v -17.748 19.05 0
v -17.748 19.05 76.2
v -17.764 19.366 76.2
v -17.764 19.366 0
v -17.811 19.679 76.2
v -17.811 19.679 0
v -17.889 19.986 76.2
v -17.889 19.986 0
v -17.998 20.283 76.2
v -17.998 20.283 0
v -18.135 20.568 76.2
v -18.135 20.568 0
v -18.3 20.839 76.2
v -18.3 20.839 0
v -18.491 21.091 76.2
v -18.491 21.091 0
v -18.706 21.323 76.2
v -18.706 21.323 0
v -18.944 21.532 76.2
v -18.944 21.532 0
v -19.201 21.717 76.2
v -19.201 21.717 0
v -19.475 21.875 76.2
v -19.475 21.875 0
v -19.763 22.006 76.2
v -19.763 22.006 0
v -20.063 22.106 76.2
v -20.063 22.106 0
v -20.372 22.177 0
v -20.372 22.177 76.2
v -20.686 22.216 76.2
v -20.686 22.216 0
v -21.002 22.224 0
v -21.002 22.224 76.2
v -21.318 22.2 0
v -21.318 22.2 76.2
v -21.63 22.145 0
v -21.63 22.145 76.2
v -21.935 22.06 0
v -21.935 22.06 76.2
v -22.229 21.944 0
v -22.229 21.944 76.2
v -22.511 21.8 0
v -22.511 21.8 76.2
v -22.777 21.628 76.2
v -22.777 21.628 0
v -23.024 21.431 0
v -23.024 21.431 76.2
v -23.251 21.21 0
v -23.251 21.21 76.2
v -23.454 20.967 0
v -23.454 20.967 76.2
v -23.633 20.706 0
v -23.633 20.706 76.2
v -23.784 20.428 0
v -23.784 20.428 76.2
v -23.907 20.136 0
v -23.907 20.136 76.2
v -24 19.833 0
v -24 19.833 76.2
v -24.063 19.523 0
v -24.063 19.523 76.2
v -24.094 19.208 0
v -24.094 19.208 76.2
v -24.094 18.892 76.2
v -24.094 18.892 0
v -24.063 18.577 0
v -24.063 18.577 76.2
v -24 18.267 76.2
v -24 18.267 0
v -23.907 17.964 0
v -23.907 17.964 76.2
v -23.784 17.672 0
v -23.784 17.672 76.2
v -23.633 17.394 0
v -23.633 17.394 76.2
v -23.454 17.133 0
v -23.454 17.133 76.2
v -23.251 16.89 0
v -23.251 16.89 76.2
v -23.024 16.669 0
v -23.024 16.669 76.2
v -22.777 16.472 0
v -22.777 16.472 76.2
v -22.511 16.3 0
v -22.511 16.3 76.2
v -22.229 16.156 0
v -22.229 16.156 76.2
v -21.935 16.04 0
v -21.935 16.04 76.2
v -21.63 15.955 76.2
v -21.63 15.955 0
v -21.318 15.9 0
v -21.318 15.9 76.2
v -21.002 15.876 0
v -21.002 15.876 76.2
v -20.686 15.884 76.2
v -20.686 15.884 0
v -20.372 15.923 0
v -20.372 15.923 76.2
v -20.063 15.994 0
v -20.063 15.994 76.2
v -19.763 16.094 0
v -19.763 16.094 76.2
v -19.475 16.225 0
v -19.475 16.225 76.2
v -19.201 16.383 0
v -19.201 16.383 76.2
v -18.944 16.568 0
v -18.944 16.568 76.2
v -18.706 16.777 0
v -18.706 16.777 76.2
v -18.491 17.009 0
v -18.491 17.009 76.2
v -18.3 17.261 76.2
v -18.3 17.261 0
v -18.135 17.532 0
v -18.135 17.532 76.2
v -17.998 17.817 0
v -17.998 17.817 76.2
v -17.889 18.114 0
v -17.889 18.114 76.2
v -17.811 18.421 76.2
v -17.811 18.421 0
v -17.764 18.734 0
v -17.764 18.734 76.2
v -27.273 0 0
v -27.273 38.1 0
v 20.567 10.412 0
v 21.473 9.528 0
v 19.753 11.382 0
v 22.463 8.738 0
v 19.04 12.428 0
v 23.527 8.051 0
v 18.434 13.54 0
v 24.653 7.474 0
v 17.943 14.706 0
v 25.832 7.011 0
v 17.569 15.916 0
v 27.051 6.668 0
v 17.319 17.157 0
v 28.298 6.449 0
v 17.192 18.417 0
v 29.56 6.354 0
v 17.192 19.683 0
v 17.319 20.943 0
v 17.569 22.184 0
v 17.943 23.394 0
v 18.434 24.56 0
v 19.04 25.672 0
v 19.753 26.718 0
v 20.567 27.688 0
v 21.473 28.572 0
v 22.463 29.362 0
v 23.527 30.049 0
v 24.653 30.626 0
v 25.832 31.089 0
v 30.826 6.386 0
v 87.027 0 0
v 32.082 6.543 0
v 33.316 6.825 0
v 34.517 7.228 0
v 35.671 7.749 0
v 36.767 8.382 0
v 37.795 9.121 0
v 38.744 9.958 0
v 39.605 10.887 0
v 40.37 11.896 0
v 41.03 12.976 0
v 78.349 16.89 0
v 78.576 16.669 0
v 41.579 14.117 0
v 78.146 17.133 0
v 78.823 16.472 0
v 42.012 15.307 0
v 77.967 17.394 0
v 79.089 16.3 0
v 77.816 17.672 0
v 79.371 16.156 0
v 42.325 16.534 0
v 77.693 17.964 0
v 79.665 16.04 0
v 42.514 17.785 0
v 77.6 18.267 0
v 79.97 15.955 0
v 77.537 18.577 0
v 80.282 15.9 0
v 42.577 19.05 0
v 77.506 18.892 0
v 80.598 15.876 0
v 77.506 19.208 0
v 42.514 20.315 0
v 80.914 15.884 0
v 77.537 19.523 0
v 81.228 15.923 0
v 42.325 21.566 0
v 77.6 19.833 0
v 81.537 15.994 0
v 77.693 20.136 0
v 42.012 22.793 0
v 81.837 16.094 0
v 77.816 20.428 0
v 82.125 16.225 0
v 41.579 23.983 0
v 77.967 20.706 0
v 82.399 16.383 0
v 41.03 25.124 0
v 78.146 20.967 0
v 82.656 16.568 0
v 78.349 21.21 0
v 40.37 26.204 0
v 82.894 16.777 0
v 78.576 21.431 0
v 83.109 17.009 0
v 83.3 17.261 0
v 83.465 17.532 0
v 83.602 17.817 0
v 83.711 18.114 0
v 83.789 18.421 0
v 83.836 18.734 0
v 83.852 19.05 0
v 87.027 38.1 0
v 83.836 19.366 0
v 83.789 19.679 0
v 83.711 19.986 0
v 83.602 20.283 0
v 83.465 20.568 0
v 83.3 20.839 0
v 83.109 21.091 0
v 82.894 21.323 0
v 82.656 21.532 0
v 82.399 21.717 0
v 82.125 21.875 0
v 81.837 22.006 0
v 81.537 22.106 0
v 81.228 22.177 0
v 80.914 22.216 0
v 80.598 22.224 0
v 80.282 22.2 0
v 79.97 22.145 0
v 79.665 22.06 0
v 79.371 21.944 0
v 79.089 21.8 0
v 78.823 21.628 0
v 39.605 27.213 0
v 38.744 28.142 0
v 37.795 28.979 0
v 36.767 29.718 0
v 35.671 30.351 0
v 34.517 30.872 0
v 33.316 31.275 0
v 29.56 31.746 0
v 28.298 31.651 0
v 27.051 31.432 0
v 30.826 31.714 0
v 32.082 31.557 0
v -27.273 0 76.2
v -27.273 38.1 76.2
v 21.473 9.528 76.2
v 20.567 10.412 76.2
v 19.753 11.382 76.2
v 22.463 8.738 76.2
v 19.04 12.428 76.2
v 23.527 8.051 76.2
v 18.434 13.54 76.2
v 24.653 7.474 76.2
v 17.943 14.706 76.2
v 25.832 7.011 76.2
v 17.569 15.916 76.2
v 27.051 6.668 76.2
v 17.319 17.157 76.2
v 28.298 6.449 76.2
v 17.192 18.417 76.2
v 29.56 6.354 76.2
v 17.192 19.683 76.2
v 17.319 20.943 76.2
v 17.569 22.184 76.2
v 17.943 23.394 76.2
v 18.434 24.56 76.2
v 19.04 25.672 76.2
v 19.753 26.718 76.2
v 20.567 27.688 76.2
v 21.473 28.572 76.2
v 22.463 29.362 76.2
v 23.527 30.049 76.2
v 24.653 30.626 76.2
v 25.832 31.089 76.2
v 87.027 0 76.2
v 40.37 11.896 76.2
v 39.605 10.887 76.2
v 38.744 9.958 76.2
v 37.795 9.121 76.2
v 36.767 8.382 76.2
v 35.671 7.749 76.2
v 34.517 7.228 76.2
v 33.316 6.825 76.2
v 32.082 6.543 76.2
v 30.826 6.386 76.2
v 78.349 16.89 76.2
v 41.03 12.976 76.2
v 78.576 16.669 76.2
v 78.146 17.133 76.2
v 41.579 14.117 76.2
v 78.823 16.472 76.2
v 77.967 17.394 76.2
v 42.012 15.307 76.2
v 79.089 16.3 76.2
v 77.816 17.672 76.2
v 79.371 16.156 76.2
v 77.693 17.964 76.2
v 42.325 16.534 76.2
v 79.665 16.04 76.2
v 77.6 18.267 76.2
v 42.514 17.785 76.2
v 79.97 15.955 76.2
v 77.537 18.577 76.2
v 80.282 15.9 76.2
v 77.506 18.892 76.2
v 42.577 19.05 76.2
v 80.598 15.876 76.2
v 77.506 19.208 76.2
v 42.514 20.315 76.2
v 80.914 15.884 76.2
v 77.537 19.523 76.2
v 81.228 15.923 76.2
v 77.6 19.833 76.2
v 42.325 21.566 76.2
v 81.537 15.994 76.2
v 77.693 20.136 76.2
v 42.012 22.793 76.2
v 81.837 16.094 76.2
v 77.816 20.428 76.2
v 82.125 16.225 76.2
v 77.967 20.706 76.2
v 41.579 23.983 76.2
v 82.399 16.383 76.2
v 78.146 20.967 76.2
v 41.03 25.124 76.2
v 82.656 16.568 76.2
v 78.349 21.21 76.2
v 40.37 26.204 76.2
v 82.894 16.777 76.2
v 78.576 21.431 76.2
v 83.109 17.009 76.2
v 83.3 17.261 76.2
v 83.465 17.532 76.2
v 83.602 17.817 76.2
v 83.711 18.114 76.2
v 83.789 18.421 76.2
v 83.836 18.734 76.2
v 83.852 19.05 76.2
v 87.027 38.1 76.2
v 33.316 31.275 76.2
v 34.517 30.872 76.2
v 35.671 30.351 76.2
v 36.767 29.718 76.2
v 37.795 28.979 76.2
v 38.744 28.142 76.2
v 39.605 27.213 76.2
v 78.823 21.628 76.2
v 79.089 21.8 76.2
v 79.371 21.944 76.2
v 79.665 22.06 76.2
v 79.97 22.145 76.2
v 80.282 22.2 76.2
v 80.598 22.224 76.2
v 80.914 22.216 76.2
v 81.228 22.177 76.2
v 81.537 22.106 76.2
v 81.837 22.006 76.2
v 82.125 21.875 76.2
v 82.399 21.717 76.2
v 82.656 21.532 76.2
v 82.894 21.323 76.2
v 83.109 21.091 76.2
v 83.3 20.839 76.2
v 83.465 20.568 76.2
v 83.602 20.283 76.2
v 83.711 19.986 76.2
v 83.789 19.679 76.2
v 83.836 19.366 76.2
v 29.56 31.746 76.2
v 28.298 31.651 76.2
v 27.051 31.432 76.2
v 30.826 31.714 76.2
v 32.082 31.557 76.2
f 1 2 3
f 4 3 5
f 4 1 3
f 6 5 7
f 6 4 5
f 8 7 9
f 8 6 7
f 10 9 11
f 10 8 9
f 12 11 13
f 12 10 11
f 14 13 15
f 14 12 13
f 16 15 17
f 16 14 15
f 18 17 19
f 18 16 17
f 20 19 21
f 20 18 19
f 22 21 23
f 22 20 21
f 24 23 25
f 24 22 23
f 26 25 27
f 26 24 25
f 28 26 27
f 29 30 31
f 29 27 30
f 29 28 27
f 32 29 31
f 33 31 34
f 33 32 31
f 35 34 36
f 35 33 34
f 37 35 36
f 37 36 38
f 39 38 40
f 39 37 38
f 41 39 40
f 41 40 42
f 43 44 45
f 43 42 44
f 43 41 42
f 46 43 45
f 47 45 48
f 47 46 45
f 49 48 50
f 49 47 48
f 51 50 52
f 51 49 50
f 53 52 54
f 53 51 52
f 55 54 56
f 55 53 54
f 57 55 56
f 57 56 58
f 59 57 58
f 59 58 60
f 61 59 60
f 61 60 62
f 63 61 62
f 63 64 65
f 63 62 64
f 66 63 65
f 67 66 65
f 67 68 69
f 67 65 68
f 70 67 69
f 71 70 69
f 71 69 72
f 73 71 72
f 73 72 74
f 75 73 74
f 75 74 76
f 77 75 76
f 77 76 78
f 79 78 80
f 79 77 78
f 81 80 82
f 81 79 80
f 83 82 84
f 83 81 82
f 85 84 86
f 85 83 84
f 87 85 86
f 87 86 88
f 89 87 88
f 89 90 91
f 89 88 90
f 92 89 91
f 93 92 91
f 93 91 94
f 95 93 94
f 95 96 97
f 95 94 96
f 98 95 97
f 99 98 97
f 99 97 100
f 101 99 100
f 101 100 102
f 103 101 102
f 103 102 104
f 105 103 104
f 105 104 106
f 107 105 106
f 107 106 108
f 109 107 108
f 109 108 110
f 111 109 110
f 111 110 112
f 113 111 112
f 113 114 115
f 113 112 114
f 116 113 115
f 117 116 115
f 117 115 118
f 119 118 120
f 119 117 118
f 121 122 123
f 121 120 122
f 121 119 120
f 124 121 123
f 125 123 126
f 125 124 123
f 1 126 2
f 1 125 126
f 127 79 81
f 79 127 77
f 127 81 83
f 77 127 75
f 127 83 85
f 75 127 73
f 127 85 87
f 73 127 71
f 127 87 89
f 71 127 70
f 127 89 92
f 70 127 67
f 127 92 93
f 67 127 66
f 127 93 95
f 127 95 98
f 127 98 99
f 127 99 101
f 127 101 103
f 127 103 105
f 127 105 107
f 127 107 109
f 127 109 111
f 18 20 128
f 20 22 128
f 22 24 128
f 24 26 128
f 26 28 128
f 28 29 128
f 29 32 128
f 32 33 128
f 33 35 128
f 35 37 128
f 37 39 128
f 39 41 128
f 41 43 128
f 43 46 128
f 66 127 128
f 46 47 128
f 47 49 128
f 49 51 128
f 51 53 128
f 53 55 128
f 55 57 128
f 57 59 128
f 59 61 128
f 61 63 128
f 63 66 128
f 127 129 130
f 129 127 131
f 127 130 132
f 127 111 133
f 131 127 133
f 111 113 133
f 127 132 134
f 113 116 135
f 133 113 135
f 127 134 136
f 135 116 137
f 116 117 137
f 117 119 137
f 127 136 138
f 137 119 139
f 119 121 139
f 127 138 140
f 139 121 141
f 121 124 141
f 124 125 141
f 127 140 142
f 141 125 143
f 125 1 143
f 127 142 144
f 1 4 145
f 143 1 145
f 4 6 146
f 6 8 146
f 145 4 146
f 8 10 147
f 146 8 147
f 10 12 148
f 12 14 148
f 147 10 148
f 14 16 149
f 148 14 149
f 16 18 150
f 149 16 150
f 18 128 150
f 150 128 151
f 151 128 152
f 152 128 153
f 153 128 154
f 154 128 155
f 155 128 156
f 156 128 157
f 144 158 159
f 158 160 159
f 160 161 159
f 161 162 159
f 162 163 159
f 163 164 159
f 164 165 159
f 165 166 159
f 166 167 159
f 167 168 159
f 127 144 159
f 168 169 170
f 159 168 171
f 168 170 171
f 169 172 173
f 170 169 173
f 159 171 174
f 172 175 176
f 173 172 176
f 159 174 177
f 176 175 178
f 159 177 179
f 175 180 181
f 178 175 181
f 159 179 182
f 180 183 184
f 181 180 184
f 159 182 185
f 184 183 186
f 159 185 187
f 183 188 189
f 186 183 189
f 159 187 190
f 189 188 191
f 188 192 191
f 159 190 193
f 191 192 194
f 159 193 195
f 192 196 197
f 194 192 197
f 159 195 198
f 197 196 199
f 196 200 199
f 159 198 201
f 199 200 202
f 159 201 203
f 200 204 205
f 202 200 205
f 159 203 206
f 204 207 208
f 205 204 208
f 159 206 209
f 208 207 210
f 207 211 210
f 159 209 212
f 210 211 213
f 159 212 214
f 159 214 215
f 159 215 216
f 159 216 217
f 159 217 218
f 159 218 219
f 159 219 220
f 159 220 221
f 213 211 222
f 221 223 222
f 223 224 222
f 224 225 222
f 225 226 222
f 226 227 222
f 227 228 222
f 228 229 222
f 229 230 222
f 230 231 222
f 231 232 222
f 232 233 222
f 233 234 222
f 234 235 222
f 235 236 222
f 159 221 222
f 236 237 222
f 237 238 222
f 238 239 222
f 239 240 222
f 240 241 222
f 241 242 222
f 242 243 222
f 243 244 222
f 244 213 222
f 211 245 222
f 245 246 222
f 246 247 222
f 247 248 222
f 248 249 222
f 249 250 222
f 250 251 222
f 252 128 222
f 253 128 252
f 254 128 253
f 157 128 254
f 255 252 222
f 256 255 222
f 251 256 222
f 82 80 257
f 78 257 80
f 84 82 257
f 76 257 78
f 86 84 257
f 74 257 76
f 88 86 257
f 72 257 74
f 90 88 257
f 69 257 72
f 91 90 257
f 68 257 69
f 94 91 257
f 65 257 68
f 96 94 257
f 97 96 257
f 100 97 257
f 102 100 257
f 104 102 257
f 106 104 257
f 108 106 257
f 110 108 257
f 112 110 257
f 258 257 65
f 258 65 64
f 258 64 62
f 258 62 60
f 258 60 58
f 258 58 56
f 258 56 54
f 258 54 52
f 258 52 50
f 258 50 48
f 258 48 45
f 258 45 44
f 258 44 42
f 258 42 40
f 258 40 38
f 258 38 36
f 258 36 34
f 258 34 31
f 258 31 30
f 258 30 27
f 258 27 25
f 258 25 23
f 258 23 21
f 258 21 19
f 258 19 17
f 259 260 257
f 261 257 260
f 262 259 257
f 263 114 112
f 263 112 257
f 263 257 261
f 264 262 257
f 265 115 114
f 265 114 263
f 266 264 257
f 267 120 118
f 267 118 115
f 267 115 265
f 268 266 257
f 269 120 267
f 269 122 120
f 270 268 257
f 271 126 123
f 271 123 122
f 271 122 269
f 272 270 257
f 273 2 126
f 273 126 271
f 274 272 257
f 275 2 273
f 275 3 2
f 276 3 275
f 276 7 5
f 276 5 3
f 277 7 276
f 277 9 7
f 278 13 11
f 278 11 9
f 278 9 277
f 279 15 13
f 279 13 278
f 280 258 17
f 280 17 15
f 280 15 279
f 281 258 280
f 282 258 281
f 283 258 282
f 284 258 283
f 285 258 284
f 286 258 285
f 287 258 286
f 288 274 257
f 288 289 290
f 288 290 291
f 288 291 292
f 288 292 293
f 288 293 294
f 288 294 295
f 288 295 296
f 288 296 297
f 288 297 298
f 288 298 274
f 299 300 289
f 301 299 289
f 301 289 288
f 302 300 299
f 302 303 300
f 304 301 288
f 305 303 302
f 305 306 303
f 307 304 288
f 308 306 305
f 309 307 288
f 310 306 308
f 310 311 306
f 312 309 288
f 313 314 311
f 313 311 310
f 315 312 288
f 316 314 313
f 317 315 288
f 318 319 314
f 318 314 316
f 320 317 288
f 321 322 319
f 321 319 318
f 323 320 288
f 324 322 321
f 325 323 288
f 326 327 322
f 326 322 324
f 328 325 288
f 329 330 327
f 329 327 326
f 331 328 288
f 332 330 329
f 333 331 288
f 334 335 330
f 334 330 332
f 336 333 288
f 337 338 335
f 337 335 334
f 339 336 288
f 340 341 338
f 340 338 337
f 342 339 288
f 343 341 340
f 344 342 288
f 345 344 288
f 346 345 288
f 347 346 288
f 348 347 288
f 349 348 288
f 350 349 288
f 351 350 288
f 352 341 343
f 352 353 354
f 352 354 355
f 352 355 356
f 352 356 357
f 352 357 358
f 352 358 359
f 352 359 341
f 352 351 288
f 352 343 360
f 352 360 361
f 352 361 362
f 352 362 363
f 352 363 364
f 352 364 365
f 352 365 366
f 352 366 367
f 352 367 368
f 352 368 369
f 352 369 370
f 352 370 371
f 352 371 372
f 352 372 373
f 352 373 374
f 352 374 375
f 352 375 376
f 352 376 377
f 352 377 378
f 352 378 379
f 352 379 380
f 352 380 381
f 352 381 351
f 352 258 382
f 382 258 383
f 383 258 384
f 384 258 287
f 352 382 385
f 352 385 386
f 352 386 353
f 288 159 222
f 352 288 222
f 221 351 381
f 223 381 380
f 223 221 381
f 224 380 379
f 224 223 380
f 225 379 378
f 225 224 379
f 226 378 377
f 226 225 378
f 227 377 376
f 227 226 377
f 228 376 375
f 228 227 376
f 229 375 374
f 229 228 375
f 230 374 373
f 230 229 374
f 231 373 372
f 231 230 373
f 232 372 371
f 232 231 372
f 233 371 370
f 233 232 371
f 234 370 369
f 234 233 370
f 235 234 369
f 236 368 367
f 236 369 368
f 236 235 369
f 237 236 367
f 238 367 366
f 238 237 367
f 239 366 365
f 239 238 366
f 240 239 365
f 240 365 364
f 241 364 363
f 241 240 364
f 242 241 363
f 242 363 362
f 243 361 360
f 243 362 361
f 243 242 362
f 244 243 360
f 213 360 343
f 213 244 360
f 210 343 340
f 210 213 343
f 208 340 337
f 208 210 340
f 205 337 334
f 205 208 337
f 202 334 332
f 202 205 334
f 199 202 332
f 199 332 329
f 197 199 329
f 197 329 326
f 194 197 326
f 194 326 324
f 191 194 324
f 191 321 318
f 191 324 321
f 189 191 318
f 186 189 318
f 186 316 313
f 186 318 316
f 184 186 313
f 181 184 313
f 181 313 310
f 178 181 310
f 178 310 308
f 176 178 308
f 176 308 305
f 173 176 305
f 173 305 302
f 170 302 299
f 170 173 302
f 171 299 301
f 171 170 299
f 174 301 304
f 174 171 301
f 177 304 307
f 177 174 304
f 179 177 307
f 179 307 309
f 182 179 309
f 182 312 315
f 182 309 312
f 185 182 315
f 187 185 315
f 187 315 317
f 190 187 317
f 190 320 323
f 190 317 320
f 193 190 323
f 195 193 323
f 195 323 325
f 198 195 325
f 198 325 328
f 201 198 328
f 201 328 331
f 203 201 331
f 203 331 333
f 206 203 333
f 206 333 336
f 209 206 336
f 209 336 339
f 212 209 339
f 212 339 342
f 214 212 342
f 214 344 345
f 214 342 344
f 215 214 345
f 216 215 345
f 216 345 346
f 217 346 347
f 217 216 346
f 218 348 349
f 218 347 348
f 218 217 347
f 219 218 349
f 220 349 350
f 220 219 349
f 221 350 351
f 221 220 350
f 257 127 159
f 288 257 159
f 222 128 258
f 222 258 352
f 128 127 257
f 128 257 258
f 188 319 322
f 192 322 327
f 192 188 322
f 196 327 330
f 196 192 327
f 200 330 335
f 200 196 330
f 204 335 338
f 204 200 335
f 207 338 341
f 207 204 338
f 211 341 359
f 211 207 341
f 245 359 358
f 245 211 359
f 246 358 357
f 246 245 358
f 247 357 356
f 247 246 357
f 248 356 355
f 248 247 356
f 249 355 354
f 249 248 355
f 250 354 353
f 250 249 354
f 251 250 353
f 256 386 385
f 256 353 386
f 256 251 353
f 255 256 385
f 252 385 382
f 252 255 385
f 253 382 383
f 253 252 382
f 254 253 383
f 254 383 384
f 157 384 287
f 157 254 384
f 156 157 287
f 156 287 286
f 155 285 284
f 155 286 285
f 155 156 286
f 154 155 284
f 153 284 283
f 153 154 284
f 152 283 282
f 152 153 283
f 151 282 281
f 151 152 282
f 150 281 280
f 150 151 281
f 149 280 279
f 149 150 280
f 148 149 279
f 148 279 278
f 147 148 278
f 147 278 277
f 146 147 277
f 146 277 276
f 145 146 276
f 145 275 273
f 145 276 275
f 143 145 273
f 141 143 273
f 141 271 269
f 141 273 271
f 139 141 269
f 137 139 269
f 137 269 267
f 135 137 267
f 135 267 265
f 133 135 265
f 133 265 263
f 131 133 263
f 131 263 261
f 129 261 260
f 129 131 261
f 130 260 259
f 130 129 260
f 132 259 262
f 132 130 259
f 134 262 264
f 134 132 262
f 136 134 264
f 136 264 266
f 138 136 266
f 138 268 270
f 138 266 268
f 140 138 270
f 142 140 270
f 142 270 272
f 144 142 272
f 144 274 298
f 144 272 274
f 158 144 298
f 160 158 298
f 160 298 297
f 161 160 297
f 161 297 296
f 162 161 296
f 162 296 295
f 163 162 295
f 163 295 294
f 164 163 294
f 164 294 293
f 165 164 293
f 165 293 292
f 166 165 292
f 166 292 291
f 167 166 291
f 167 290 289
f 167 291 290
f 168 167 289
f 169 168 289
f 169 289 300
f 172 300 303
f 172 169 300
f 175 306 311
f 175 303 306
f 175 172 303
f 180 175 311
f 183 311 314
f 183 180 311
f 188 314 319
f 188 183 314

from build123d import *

# Parameters (mm, degrees)
F0_W     = 114.3
F0_H     = 38.1
F1_DEPTH = 76.2
F2_R     = 12.7
F3_DEPTH = 85.598
F4_R     = 3.175
F5_DEPTH = 90.678
F6_R     = 3.175
F7_DEPTH = 90.678


with BuildPart() as f1:
    # F0 (on Top) → F1 (new body)
    with BuildSketch(Plane.XY):
        with Locations((29.87668, 19.05)):
            Rectangle(F0_W, F0_H)
    extrude(amount=F1_DEPTH)

    # F2 (on Top) → F3 (cut)
    with BuildSketch(Plane.XY):
        with Locations((29.87668, 19.05)):
            Circle(F2_R)
    extrude(amount=F3_DEPTH, mode=Mode.SUBTRACT)

    # F4 (on Top) → F5 (cut)
    with BuildSketch(Plane.XY):
        with Locations((-20.92332, 19.05)):
            Circle(F4_R)
    extrude(amount=F5_DEPTH, mode=Mode.SUBTRACT)

    # F6 (on Top) → F7 (cut)
    with BuildSketch(Plane.XY):
        with Locations((80.67668, 19.05)):
            Circle(F6_R)
    extrude(amount=F7_DEPTH, mode=Mode.SUBTRACT)


solid = f1.part
